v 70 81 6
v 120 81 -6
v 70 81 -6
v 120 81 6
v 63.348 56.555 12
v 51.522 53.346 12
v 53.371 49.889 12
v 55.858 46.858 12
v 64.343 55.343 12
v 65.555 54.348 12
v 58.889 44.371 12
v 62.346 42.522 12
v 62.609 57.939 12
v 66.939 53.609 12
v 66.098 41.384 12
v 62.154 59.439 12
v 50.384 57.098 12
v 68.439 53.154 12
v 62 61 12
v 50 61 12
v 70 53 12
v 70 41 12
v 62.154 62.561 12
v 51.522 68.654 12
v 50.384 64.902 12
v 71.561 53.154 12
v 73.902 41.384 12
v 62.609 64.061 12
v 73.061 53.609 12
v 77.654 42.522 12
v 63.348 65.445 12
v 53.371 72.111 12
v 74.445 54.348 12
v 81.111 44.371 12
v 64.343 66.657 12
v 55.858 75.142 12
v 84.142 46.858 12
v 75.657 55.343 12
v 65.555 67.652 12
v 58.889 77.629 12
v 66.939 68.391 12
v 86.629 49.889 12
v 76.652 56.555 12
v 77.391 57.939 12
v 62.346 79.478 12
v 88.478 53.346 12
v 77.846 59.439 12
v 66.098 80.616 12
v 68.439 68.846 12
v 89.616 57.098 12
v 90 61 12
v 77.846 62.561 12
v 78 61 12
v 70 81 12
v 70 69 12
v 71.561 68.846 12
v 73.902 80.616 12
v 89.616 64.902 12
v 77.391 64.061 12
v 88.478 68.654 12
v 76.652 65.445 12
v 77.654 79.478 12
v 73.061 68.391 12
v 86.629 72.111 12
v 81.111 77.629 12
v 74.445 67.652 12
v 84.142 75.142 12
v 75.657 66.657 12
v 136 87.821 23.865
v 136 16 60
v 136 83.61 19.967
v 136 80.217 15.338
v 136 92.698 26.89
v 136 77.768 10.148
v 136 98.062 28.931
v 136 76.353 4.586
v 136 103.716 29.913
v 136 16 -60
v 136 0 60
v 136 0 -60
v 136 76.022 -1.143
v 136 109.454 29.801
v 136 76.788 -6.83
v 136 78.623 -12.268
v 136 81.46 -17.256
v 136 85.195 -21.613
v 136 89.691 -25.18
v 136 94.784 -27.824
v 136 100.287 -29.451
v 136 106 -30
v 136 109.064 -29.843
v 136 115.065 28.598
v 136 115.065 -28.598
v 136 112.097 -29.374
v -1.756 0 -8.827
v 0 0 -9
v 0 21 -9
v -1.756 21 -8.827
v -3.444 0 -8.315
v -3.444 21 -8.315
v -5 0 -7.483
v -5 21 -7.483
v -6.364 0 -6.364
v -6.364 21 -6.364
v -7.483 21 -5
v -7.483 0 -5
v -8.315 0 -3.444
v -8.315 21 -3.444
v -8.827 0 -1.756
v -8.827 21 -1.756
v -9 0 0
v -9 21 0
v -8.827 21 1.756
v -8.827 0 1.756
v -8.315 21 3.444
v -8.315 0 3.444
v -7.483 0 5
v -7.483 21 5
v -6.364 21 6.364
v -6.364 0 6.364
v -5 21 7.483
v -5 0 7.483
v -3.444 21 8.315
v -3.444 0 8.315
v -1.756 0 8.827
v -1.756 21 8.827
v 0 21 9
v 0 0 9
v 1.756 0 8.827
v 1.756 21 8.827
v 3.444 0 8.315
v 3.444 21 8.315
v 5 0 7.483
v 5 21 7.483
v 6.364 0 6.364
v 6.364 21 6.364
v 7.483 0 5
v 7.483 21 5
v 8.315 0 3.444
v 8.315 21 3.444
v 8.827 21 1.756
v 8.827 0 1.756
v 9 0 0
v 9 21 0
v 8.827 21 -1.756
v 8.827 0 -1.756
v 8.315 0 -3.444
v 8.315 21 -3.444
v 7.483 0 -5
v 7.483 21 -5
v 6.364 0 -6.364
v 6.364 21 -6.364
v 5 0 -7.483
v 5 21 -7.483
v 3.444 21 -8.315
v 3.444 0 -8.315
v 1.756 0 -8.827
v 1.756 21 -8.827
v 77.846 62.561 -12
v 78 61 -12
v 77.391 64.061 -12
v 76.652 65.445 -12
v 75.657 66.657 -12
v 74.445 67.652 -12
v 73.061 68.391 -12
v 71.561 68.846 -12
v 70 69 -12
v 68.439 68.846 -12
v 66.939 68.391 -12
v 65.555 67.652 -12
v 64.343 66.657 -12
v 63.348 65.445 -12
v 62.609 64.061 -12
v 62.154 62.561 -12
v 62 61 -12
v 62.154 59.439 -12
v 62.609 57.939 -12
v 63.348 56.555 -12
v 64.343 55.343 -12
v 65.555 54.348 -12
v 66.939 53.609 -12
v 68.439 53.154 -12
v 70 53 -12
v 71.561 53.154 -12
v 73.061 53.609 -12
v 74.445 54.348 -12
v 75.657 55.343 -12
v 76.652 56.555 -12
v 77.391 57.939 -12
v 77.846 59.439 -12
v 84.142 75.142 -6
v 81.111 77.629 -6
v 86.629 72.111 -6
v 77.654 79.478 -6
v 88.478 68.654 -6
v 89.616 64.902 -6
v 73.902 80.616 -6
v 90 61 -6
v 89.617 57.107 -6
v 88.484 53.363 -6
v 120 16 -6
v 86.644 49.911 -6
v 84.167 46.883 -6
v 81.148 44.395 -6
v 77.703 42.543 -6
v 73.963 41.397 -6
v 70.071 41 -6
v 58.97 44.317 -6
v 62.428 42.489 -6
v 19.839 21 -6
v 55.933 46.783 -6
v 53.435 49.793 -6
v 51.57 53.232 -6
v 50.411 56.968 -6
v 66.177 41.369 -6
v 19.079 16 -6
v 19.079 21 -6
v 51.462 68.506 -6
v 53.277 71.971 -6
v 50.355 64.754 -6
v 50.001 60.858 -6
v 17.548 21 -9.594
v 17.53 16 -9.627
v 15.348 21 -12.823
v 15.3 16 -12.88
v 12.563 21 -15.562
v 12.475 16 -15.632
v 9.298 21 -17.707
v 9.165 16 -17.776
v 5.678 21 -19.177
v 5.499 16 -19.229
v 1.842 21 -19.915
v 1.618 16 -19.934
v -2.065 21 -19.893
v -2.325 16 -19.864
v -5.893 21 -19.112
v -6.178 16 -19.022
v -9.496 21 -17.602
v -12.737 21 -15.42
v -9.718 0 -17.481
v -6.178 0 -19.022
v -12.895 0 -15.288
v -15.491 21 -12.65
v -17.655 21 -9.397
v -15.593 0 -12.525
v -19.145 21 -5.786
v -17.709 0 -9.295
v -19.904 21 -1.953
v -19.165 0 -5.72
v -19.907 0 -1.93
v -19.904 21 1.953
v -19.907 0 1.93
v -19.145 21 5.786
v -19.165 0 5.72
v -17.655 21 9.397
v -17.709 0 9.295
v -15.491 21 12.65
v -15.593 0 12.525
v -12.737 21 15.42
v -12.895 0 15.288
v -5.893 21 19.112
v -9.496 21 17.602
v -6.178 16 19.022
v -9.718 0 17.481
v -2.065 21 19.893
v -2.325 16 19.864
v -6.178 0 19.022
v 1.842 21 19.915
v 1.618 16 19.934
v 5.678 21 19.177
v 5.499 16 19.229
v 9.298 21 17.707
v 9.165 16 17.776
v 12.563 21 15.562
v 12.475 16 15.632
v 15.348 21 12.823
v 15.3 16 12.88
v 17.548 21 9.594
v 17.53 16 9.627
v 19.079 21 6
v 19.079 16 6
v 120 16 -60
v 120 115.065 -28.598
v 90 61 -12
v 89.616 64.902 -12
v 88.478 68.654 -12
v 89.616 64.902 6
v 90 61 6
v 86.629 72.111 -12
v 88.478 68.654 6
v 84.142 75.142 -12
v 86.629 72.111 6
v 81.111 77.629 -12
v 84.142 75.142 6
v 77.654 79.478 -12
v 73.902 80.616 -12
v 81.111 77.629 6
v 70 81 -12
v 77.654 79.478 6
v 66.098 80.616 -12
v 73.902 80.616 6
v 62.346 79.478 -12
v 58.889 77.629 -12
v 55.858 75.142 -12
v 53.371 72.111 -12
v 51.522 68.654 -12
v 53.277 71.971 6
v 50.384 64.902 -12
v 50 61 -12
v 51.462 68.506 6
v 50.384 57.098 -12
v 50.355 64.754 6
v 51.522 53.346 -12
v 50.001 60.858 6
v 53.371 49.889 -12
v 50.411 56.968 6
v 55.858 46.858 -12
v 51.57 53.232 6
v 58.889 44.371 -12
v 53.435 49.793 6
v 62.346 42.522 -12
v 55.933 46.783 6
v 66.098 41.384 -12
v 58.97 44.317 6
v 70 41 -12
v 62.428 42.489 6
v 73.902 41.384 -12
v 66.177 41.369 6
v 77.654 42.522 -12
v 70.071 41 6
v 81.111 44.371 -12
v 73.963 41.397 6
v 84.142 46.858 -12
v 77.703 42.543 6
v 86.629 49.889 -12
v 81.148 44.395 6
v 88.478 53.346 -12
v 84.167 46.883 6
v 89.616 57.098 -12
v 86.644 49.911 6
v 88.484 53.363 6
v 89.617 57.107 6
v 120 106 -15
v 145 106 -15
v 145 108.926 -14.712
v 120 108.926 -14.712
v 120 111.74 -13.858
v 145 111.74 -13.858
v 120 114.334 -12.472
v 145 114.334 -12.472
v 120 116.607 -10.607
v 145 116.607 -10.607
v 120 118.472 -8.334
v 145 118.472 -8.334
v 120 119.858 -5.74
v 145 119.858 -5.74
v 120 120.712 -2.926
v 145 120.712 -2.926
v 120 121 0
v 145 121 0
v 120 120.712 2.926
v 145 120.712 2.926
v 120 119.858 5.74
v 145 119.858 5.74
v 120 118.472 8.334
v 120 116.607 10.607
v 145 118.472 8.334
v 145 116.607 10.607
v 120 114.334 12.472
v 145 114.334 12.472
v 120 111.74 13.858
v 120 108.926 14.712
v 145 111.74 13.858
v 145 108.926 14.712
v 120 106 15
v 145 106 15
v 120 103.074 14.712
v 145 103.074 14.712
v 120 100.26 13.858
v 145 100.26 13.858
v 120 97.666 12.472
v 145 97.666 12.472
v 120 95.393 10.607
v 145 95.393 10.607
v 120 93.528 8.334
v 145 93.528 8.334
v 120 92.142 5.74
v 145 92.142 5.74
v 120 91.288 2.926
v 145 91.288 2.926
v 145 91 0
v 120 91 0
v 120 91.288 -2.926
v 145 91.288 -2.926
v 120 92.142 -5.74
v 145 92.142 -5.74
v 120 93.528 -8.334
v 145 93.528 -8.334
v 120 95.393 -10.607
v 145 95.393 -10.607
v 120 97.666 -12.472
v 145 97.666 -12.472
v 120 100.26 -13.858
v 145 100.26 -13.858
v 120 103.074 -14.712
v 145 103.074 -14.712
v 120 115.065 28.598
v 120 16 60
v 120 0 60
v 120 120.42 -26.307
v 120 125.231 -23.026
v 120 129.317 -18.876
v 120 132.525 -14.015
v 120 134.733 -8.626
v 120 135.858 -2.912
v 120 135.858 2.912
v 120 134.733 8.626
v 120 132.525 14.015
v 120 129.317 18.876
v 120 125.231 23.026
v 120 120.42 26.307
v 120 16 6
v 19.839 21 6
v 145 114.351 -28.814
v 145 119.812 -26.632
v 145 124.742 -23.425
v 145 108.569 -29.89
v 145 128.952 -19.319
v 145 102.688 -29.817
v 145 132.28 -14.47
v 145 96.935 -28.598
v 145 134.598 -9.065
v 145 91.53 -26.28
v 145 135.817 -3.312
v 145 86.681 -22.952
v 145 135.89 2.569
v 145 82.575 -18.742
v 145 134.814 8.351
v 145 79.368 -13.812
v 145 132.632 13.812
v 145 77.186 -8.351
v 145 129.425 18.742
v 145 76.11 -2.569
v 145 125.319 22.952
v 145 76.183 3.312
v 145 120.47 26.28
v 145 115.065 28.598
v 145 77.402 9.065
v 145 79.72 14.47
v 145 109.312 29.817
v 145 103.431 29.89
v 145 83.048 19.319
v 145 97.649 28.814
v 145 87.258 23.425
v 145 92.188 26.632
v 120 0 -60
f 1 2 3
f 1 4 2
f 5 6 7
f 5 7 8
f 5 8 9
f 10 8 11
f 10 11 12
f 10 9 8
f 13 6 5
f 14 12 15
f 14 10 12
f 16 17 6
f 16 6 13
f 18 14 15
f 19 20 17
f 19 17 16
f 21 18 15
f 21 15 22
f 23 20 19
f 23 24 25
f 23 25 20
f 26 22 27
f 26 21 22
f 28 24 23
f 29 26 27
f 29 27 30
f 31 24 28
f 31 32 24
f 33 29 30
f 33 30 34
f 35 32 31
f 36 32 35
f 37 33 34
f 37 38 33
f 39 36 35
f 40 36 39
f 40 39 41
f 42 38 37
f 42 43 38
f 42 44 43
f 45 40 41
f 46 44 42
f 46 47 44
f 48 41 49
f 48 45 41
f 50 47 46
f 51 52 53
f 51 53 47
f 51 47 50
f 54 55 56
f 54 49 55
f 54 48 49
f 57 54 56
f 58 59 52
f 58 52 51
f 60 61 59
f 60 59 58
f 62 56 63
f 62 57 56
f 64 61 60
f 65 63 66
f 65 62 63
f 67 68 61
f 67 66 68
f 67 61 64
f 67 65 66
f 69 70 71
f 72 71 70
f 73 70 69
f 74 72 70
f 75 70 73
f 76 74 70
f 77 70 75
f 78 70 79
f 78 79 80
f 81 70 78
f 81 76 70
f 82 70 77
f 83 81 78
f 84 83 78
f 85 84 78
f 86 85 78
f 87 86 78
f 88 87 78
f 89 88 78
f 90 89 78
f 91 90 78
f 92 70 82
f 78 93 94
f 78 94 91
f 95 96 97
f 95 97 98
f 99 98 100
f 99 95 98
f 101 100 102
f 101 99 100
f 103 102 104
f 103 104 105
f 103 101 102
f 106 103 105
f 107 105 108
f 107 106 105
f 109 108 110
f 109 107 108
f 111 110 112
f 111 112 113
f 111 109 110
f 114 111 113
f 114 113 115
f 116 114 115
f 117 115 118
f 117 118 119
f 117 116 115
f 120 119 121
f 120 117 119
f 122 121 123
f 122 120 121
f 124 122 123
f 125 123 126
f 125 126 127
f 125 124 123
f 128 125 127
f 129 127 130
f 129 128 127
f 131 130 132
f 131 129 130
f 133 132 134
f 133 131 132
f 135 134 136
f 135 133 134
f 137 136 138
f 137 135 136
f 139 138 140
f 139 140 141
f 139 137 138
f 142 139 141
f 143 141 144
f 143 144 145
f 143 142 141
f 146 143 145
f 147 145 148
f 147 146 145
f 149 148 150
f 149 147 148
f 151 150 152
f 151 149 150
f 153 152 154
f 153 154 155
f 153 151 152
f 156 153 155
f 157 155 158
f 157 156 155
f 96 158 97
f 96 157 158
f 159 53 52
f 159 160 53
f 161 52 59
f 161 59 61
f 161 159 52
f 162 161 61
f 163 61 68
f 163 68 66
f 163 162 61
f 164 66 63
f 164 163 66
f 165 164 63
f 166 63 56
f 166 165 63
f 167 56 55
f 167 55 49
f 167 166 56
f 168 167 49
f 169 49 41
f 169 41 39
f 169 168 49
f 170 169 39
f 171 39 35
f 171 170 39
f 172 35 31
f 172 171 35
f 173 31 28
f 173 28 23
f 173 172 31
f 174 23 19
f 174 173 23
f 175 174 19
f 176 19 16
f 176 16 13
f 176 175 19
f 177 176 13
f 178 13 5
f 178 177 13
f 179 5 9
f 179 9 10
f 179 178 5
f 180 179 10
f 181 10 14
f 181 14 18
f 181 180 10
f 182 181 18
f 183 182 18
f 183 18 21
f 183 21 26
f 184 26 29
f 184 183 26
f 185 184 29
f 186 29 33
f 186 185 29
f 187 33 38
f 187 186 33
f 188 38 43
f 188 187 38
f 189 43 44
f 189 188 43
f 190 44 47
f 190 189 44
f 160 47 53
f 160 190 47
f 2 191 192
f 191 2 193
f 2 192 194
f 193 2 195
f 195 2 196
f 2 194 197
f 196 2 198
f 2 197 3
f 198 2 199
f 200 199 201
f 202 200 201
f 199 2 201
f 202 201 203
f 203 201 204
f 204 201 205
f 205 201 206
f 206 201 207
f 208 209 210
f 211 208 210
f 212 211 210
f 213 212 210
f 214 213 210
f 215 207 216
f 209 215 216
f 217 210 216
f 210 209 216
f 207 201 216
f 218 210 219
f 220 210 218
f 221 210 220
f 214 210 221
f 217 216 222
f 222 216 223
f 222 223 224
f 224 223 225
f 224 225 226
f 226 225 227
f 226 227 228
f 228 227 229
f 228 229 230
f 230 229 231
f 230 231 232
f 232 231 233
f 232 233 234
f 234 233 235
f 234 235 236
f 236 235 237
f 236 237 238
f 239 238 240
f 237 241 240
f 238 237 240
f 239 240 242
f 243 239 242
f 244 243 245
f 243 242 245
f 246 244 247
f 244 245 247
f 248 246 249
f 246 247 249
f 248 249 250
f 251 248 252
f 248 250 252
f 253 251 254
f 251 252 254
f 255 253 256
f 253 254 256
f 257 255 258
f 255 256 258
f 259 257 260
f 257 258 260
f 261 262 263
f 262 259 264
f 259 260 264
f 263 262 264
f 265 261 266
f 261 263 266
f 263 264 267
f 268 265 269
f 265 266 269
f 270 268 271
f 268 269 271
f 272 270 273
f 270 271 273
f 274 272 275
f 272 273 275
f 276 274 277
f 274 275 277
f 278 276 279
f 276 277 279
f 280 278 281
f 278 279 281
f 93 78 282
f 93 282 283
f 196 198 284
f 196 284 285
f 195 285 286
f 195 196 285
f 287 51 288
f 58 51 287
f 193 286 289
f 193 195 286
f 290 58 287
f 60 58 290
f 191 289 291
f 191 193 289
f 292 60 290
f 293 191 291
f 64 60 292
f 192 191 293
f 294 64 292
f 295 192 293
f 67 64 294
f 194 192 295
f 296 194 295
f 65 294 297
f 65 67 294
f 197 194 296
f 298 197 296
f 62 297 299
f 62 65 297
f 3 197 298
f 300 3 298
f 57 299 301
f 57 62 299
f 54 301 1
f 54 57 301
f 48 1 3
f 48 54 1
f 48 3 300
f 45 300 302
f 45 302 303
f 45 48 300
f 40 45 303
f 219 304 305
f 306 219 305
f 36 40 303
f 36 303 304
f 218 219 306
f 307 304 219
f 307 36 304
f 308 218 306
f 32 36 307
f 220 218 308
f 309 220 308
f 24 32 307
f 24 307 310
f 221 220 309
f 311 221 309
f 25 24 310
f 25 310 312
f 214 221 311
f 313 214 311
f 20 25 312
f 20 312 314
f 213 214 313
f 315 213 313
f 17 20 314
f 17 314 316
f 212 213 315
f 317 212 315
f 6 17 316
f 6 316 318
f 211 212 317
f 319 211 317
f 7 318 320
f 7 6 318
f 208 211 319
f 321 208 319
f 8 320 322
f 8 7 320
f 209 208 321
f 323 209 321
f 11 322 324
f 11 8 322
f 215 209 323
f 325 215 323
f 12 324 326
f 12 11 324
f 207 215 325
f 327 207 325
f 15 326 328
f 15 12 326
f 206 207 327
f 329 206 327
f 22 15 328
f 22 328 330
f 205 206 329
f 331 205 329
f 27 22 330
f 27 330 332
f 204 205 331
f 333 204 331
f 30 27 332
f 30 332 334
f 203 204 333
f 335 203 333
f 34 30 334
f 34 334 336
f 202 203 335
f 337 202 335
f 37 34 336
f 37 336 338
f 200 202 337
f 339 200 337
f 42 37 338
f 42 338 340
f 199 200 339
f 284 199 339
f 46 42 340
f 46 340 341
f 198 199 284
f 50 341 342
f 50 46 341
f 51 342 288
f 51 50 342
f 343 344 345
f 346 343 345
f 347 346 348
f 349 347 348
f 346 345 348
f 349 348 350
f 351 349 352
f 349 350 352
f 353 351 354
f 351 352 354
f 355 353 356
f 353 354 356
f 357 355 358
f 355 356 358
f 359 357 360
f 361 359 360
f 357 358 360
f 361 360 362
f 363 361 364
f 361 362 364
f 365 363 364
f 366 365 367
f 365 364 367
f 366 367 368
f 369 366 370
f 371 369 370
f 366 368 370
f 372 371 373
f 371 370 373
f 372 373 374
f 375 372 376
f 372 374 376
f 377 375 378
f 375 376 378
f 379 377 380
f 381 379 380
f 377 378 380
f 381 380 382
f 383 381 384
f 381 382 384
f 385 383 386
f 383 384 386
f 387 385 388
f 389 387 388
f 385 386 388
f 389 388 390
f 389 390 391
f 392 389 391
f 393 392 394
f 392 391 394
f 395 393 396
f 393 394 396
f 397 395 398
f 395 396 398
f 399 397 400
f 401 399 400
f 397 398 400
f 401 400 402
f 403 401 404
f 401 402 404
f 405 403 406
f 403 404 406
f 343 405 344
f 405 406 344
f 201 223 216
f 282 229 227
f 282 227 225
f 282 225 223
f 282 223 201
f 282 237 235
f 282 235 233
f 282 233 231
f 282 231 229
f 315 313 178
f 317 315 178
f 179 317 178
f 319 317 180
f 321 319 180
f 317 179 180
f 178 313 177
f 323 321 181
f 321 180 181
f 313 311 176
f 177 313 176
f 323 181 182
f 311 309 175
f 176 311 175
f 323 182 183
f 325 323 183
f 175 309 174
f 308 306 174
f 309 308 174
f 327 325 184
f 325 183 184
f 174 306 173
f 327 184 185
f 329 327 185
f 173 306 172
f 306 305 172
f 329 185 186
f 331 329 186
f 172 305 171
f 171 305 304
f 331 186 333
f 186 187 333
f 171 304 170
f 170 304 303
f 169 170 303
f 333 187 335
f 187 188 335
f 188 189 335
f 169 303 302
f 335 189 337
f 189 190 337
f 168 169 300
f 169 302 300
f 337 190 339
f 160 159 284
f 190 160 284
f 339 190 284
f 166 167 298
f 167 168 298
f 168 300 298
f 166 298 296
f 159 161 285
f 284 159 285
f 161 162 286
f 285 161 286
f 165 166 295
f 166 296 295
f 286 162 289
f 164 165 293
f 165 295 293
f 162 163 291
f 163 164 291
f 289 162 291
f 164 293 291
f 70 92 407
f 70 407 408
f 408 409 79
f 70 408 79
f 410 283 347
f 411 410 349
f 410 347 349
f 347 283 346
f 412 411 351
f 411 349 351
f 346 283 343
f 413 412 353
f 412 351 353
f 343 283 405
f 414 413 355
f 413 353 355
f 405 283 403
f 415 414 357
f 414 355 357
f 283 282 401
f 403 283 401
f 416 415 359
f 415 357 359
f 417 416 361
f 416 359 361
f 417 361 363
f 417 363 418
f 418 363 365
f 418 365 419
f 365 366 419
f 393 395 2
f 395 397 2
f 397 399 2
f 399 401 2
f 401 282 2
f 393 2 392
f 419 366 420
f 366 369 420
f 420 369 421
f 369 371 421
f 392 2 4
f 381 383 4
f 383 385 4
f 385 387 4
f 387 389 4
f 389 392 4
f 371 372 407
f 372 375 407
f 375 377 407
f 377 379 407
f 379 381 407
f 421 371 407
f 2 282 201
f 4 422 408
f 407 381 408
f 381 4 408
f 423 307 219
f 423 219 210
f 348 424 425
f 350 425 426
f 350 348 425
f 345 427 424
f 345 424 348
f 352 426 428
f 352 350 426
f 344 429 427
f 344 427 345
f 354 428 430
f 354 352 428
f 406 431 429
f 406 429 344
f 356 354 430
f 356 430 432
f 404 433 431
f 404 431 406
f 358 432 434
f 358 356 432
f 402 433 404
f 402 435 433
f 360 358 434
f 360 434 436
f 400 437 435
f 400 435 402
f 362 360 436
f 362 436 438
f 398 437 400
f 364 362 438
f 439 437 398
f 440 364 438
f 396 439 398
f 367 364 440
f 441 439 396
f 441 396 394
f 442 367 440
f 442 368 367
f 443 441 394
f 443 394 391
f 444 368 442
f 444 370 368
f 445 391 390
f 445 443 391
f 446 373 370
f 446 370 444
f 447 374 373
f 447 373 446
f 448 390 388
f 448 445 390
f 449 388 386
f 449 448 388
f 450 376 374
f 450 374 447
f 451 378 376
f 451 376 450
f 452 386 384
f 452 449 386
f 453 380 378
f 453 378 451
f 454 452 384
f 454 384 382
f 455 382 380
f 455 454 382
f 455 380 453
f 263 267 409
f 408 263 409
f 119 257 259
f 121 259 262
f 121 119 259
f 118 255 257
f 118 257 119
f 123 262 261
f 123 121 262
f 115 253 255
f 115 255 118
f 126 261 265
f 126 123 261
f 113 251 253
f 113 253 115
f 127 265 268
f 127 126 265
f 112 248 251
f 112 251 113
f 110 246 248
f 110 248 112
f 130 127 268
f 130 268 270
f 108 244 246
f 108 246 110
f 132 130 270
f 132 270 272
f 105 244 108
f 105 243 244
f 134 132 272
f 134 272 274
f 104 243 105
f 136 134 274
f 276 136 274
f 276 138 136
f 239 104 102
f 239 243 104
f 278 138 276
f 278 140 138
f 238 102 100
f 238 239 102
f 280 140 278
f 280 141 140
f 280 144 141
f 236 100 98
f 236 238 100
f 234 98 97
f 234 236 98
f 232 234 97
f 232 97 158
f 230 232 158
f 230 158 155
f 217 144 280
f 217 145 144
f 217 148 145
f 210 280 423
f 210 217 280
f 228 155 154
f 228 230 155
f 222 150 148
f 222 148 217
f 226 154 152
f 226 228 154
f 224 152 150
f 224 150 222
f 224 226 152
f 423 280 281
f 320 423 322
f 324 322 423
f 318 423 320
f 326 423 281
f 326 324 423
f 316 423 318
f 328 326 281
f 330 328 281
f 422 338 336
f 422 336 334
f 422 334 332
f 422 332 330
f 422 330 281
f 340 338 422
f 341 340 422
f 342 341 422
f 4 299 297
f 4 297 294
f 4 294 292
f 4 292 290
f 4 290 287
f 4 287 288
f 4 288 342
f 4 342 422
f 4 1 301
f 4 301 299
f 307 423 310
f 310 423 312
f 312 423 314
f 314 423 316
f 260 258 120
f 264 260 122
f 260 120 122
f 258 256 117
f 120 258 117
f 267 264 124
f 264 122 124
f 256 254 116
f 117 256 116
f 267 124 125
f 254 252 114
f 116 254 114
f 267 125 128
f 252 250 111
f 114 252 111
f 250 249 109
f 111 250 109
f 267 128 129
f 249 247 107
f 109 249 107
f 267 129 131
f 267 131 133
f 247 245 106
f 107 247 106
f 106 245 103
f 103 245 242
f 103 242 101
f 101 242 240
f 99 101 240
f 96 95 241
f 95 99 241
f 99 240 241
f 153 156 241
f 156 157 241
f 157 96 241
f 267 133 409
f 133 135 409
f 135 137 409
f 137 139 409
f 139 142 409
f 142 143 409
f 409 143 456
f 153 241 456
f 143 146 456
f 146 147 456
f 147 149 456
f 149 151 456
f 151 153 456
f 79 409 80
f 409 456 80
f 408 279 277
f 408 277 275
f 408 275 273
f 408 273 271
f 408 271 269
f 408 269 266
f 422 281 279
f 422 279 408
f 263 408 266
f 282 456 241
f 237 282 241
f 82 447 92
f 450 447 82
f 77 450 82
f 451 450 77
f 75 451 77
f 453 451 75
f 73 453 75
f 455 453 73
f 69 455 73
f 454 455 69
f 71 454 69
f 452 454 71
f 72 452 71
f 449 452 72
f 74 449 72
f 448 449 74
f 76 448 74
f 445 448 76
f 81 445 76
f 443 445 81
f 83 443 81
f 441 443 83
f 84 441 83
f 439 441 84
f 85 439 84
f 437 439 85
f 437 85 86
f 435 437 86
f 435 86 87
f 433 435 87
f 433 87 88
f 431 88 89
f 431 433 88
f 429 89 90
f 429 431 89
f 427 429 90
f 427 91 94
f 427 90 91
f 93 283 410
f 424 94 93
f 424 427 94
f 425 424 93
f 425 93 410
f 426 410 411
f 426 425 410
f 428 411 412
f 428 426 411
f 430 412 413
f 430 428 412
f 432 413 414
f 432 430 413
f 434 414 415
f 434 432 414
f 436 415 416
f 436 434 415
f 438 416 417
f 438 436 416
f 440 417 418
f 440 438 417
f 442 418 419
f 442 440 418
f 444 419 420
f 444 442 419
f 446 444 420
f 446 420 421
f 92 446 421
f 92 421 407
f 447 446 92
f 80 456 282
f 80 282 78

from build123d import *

# Parameters (mm, degrees)
SKETCH1_R           = 9
BOSS_EXTRUDE1_DEPTH = 21
BOSS_EXTRUDE2_DEPTH = 16
BOSS_EXTRUDE3_DEPTH = 16
BOSS_EXTRUDE4_START = 9
SKETCH2_3_R         = 15
BOSS_EXTRUDE4_DEPTH = 25
GURT_R              = 8
BOSS_EXTRUDE5_DEPTH = 12
BOSS_EXTRUDE6_DEPTH = 6
BOSS_EXTRUDE7_DEPTH = 5


with BuildPart() as part:
    # Sketch1 → Boss-Extrude1 (new body)
    with BuildSketch(Plane(origin=(0, 0, 0), x_dir=(1, 0, 0), z_dir=(0, 1, 0))):
        with BuildLine():
            ThreePointArc((-6.177666108, 19.021998882), (-20, 0), (-6.177666108, -19.021998882))
            ThreePointArc((-6.177666108, -19.021998882), (11.756842217, -16.179513623), (20, 0))
            ThreePointArc((20, 0), (11.756842217, 16.179513623), (-6.177666108, 19.021998882))
        make_face()
        Circle(SKETCH1_R, mode=Mode.SUBTRACT)
    extrude(amount=BOSS_EXTRUDE1_DEPTH)

    # Sketch1<3> → Boss-Extrude2 (add)
    with BuildSketch(Plane(origin=(0, 0, 0), x_dir=(1, 0, 0), z_dir=(0, 1, 0))):
        with BuildLine():
            ThreePointArc((-6.177666108, 19.021998882), (20, 0), (-6.177666108, -19.021998882))
            Line((-6.177666108, -19.021998882), (120, -60))
            Line((120, -60), (136, -60))
            Line((136, -60), (136, 60))
            Line((136, 60), (120, 60))
            Line((120, 60), (-6.177666108, 19.021998882))
        make_face()
    extrude(amount=BOSS_EXTRUDE2_DEPTH)

    # Sketch2 → Boss-Extrude3 (add)
    with BuildSketch(Plane(origin=(136, 0, 0), x_dir=(0, 0, -1), z_dir=(1, 0, 0))):
        with BuildLine():
            Line((-28.597626566, 115.065084378), (-60, 16))
            Line((-60, 16), (60, 16))
            Line((60, 16), (28.597626566, 115.065084378))
            ThreePointArc((28.597626566, 115.065084378), (29.64733375, 110.586458493), (30, 106))
            ThreePointArc((30, 106), (-4.586458493, 76.35266625), (-28.597626566, 115.065084378))
        make_face()
    extrude(amount=-BOSS_EXTRUDE3_DEPTH)

    # Sketch2<3> → Boss-Extrude4 (add)
    with BuildSketch(Plane(origin=(136, 0, 0), x_dir=(0, 0, -1), z_dir=(1, 0, 0)).offset(BOSS_EXTRUDE4_START)):
        with BuildLine():
            ThreePointArc((28.597626566, 115.065084378), (0, 136), (-28.597626566, 115.065084378))
            ThreePointArc((-28.597626566, 115.065084378), (-4.586458493, 76.35266625), (30, 106))
            ThreePointArc((30, 106), (29.64733375, 110.586458493), (28.597626566, 115.065084378))
        make_face()
        with Locations((0, 106)):
            Circle(SKETCH2_3_R, mode=Mode.SUBTRACT)
    extrude(amount=-BOSS_EXTRUDE4_DEPTH)



with BuildPart() as body_2:
    # gurt → Boss-Extrude5 (new, symmetric)
    with BuildSketch(Plane.XY):
        with BuildLine():
            ThreePointArc((90, 61), (84.142135624, 75.142135624), (70, 81))
            ThreePointArc((70, 81), (60.497728875, 78.598489807), (53.277437847, 71.970684347))
            ThreePointArc((53.277437847, 71.970684347), (64.275108868, 41.83686817), (90, 61))
        make_face()
        with Locations((70, 61)):
            Circle(GURT_R, mode=Mode.SUBTRACT)
    extrude(amount=BOSS_EXTRUDE5_DEPTH, both=True)


with BuildPart() as part_1:
    add(part.part)

    add(body_2.part)  # Boss-Extrude6 merges body 2
    # gurt<4> → Boss-Extrude6 (add, symmetric)
    with BuildSketch(Plane.XY):
        with BuildLine():
            Line((120, 81), (70, 81))
            ThreePointArc((70, 81), (84.142135624, 75.142135624), (90, 61))
            ThreePointArc((90, 61), (64.275108868, 41.83686817), (53.277437847, 71.970684347))
            Line((53.277437847, 71.970684347), (19.838585367, 21))
            Line((19.838585367, 21), (19.838585367, 16))
            Line((19.838585367, 16), (120, 16))
            Line((120, 16), (120, 81))
        make_face()
    extrude(amount=BOSS_EXTRUDE6_DEPTH, both=True)

    # Sketch4 → Boss-Extrude7 (add)
    with BuildSketch(Plane(origin=(0, 16, 0), x_dir=(1, 0, 0), z_dir=(0, 1, 0))):
        Polygon((19.838585367, 2.535849097), (19.838585367, 6), (18.936316569, 6), align=None)
        Polygon((19.838585367, -6), (18.936316569, -6), (19.838585367, -2.535849097), align=None)
    extrude(amount=BOSS_EXTRUDE7_DEPTH)


solid = part_1.part
